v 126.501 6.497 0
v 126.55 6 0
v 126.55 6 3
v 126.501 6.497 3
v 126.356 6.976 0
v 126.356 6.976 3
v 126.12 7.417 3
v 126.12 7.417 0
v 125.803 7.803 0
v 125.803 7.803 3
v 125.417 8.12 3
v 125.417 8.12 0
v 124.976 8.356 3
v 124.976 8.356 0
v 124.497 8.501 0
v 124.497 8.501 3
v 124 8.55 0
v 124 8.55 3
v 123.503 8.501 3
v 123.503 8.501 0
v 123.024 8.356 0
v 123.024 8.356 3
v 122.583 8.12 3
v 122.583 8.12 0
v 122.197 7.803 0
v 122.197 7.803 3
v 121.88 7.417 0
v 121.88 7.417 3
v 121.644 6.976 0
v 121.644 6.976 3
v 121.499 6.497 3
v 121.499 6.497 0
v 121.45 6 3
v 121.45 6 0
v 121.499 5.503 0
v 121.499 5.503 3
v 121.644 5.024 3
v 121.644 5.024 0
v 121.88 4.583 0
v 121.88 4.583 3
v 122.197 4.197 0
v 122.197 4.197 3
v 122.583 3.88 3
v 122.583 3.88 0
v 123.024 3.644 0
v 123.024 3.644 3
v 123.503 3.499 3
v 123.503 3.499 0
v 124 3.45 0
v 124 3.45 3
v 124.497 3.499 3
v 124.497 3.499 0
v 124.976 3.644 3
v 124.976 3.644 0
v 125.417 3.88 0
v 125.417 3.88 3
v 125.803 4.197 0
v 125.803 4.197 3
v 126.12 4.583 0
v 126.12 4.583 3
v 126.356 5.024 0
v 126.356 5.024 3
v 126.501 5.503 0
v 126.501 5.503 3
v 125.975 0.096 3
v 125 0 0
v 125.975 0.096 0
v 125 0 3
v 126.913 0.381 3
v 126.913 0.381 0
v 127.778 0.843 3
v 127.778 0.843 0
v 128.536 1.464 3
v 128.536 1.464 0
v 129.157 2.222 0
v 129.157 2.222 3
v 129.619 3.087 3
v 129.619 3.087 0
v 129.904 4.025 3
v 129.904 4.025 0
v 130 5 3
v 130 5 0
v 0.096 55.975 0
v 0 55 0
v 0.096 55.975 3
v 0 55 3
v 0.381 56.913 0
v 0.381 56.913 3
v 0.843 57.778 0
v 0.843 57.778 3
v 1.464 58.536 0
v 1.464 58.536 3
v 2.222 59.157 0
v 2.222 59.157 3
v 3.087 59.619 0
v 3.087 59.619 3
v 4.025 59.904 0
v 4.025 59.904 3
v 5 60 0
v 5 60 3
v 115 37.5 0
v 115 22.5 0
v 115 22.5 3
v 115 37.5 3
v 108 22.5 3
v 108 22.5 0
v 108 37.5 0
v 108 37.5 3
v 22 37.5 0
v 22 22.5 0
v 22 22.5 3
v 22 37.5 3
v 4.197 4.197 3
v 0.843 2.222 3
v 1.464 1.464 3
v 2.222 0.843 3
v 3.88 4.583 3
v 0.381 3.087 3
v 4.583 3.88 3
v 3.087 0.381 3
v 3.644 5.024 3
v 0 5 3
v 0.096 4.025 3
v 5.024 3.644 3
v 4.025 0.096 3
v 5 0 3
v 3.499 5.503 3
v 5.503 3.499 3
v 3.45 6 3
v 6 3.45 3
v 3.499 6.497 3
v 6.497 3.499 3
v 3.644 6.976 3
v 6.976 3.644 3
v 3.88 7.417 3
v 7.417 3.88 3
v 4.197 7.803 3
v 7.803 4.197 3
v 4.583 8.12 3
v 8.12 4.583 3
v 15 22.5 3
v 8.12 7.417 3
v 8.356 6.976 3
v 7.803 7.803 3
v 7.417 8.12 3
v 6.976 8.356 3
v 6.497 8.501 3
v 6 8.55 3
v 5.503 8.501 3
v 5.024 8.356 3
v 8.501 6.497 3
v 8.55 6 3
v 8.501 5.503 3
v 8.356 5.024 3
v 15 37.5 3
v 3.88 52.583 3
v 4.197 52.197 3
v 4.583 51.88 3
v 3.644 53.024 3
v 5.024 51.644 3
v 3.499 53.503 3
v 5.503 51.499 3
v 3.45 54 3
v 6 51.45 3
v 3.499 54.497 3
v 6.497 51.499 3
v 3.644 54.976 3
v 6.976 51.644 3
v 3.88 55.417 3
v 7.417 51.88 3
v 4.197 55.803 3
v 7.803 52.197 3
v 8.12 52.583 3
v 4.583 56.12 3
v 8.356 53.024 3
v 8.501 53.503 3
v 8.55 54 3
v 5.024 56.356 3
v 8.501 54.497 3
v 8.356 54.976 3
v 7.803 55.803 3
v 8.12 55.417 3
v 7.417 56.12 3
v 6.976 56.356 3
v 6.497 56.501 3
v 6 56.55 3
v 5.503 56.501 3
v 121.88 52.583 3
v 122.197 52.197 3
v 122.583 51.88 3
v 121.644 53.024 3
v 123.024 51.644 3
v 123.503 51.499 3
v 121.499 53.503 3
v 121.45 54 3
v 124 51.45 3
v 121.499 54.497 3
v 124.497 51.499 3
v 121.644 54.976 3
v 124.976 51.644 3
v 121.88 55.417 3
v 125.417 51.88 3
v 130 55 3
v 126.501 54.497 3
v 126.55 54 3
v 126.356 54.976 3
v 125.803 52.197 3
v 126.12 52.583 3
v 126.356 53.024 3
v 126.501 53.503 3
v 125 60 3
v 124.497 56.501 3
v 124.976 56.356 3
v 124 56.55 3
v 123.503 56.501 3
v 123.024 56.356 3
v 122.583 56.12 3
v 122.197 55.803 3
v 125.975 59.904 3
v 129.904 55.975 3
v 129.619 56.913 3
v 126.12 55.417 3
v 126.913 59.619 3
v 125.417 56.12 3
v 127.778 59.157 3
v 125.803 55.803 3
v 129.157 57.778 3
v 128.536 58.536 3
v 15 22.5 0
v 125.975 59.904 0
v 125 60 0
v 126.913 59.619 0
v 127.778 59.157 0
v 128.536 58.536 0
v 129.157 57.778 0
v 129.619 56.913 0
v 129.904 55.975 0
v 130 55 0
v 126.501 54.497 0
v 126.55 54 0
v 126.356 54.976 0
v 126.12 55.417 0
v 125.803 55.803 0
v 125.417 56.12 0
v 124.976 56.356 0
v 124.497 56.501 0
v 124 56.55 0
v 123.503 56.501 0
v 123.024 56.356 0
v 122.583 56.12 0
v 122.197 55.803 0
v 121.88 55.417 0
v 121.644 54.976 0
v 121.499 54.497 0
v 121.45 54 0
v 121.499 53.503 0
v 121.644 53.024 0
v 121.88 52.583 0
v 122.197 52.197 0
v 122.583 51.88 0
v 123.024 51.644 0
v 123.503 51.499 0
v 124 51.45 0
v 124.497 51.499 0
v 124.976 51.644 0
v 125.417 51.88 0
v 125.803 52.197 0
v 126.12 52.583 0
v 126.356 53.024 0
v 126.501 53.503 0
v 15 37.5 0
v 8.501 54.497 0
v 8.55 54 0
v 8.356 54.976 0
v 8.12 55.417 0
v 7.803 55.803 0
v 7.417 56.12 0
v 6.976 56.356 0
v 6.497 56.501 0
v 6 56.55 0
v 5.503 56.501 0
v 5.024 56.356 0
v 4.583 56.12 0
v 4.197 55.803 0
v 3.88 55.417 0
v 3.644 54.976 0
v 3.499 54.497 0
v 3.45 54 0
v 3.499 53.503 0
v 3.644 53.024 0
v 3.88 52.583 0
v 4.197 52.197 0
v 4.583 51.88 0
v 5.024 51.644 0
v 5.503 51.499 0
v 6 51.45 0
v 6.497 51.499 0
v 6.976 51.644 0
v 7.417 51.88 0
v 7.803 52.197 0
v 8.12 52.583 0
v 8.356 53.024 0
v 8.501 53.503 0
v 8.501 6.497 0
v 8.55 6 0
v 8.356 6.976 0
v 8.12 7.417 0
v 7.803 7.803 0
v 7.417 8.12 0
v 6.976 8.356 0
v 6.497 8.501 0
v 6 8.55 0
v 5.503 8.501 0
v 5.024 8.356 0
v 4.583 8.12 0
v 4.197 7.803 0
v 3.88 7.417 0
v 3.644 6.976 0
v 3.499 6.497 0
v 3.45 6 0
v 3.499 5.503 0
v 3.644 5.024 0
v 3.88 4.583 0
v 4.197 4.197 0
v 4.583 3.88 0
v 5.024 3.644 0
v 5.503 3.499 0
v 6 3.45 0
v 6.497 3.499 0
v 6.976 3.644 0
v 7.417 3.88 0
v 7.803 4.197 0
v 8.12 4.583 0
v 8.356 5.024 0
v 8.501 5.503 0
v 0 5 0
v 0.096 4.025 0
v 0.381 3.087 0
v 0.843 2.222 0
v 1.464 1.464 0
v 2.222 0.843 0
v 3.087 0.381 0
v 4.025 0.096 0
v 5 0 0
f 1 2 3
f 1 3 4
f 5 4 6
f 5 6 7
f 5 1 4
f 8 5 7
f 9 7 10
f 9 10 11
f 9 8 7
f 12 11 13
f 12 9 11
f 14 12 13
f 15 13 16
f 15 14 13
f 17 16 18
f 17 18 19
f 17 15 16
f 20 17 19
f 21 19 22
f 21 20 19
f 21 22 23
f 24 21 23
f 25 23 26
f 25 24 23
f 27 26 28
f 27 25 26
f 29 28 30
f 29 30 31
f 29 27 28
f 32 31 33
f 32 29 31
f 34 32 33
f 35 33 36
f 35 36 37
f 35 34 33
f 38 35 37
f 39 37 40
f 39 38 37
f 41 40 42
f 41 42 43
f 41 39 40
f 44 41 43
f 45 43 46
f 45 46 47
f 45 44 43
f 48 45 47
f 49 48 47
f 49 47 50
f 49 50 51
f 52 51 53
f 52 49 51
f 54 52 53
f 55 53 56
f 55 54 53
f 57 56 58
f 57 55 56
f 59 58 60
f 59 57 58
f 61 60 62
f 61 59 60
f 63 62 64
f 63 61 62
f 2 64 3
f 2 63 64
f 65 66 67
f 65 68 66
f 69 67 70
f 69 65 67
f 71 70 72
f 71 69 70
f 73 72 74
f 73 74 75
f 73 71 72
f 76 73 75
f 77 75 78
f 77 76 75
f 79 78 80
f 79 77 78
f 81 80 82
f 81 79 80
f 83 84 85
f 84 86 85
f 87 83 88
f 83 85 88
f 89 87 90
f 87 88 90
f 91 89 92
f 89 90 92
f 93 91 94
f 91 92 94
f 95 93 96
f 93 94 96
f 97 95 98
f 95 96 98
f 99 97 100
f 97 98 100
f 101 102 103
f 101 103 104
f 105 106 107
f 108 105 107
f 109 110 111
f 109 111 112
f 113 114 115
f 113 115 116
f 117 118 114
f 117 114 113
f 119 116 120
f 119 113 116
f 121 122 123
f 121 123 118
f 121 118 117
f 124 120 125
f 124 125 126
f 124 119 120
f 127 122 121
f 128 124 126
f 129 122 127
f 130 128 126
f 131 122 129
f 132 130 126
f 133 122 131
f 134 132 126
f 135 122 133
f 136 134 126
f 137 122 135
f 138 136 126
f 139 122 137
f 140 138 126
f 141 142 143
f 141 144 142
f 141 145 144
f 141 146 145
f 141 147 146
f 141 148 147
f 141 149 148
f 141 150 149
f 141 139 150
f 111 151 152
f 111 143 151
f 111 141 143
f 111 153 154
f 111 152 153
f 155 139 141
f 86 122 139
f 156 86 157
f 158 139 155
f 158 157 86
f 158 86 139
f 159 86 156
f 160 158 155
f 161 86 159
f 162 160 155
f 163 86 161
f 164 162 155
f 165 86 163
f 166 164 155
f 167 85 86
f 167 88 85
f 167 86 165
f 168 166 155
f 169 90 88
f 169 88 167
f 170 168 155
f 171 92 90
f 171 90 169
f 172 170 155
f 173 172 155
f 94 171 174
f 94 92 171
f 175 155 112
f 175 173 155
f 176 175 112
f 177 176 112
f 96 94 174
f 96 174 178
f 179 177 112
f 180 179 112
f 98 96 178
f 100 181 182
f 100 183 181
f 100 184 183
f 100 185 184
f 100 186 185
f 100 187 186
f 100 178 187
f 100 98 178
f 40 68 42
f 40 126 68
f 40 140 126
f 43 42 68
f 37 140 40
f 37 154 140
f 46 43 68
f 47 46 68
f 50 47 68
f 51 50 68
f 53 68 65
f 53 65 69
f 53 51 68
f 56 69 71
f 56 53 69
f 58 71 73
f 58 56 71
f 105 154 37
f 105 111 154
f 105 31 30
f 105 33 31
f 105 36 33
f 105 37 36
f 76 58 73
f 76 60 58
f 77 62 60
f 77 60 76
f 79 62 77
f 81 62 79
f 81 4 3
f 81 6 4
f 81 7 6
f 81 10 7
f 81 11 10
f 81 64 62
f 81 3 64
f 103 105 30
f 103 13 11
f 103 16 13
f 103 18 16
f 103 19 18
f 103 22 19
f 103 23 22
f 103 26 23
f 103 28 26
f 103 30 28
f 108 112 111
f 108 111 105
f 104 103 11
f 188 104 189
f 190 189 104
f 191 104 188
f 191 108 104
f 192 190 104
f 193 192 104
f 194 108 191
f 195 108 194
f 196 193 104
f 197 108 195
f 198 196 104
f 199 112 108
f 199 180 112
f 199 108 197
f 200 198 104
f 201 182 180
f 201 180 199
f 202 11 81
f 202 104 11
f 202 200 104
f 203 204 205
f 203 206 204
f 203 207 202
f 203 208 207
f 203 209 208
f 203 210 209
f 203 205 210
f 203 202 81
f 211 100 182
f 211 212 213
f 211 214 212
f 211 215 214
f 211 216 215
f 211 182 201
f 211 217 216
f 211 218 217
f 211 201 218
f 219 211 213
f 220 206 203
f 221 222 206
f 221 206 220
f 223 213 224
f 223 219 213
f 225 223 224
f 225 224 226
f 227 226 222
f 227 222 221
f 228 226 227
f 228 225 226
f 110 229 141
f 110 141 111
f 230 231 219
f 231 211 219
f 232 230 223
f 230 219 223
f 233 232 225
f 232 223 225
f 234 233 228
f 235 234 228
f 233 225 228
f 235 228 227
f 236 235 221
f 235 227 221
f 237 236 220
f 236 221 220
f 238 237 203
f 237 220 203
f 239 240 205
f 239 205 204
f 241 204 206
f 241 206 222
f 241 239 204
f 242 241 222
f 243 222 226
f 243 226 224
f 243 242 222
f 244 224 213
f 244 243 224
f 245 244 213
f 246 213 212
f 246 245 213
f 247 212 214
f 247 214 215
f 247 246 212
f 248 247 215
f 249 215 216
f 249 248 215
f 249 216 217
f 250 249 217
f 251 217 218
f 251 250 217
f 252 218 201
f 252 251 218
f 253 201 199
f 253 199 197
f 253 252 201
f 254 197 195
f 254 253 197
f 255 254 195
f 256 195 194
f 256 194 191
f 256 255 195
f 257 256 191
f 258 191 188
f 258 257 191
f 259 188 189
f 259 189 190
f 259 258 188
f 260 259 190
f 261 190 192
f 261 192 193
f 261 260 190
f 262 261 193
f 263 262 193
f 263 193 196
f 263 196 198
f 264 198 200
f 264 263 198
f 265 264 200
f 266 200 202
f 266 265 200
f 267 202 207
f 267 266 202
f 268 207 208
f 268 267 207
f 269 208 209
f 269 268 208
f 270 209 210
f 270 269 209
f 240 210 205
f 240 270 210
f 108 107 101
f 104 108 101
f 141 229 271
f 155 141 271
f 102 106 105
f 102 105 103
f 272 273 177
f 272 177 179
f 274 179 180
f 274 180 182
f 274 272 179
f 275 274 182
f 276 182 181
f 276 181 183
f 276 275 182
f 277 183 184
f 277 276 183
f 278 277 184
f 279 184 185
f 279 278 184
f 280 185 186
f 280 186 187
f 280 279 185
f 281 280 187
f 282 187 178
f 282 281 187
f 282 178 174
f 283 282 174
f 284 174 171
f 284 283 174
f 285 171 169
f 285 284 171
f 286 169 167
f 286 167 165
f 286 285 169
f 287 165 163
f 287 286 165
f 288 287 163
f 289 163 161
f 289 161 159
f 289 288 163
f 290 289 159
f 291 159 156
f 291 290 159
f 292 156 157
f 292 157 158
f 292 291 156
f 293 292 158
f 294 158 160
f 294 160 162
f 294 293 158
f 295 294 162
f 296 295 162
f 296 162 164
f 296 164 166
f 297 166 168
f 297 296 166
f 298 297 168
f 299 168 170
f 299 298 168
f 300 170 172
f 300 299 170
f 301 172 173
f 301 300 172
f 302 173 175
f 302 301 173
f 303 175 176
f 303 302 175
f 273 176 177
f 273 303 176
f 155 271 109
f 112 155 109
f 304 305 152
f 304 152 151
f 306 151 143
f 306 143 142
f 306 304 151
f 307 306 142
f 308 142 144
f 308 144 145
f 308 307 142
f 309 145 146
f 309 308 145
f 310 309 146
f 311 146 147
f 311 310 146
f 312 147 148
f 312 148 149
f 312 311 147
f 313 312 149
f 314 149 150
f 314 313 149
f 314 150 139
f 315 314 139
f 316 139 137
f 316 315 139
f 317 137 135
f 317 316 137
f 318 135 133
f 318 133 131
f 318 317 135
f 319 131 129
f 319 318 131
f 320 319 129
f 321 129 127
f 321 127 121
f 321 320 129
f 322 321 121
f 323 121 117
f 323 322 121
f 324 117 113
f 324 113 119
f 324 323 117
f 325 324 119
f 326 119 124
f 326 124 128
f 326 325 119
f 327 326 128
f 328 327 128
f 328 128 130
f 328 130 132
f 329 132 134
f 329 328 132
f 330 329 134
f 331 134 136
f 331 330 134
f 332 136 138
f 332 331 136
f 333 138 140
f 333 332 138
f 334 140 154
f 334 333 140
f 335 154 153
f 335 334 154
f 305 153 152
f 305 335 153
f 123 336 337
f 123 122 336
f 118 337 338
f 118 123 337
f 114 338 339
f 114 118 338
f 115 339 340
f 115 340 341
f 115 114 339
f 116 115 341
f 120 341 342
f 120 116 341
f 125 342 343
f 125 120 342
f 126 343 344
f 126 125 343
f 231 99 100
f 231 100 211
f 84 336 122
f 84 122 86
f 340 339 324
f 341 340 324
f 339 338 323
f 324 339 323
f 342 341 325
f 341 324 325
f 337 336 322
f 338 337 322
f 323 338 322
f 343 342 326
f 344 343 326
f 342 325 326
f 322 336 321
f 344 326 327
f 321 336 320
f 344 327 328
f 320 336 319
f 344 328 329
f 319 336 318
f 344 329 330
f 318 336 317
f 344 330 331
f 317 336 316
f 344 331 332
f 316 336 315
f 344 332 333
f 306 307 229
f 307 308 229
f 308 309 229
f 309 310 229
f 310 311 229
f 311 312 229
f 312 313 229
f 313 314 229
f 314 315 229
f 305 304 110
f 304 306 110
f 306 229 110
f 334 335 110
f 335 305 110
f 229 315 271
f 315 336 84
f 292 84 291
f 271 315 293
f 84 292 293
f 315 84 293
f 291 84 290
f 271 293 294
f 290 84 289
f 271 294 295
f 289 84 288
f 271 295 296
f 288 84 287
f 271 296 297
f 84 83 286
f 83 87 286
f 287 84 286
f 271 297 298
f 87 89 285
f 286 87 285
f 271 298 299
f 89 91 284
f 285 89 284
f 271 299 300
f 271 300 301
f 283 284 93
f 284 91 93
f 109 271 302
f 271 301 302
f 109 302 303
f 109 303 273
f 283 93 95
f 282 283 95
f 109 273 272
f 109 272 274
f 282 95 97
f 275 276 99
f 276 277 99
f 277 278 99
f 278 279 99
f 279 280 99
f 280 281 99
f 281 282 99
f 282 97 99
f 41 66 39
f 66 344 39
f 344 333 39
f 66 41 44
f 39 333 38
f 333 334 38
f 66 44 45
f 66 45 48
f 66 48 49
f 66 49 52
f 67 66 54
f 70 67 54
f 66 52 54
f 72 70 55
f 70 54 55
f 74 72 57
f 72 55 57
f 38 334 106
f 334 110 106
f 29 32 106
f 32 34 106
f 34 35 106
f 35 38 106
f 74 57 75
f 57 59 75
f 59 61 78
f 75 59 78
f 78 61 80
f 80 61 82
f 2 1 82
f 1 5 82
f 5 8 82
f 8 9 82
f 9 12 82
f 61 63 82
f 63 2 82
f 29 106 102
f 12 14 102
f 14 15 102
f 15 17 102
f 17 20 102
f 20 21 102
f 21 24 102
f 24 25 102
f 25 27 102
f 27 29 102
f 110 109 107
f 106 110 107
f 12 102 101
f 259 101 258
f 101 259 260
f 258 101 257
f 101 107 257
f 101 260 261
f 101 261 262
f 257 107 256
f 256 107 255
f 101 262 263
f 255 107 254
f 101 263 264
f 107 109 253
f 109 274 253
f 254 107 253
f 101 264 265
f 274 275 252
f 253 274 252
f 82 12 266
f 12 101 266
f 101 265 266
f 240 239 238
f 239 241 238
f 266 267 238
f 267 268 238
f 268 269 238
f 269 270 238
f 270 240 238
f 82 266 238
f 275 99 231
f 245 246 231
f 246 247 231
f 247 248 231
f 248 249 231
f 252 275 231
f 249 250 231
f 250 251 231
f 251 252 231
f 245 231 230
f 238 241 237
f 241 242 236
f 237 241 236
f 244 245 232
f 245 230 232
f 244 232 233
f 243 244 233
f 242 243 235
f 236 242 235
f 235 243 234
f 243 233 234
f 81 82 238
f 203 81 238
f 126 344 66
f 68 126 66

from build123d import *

# Parameters (mm, degrees)
F0_W     = 130
F0_H     = 60
F0_R     = 2.55
F0_W_2   = 7
F0_H_2   = 15
F1_DEPTH = 3
F2_R     = 5


with BuildPart() as f1:
    # F0 (on Top) → F1 (new body)
    with BuildSketch(Plane.XY):
        with Locations((65, 30)):
            Rectangle(F0_W, F0_H)
        with Locations((6, 6)):
            Circle(F0_R, mode=Mode.SUBTRACT)
        with Locations((124, 6)):
            Circle(F0_R, mode=Mode.SUBTRACT)
        with Locations((18.5, 30)):
            Rectangle(F0_W_2, F0_H_2, mode=Mode.SUBTRACT)
        with Locations((6, 54)):
            Circle(F0_R, mode=Mode.SUBTRACT)
        with Locations((111.5, 30)):
            Rectangle(F0_W_2, F0_H_2, mode=Mode.SUBTRACT)
        with Locations((124, 54)):
            Circle(F0_R, mode=Mode.SUBTRACT)
    extrude(amount=F1_DEPTH)

    # F2
    f2_edges = [f1.edges().sort_by_distance(p)[0] for p in [
        (130, 0, 1.5),
        (130, 60, 1.5),
        (0, 0, 1.5),
        (0, 60, 1.5),
    ]]
    fillet(f2_edges, radius=F2_R)


solid = f1.part
